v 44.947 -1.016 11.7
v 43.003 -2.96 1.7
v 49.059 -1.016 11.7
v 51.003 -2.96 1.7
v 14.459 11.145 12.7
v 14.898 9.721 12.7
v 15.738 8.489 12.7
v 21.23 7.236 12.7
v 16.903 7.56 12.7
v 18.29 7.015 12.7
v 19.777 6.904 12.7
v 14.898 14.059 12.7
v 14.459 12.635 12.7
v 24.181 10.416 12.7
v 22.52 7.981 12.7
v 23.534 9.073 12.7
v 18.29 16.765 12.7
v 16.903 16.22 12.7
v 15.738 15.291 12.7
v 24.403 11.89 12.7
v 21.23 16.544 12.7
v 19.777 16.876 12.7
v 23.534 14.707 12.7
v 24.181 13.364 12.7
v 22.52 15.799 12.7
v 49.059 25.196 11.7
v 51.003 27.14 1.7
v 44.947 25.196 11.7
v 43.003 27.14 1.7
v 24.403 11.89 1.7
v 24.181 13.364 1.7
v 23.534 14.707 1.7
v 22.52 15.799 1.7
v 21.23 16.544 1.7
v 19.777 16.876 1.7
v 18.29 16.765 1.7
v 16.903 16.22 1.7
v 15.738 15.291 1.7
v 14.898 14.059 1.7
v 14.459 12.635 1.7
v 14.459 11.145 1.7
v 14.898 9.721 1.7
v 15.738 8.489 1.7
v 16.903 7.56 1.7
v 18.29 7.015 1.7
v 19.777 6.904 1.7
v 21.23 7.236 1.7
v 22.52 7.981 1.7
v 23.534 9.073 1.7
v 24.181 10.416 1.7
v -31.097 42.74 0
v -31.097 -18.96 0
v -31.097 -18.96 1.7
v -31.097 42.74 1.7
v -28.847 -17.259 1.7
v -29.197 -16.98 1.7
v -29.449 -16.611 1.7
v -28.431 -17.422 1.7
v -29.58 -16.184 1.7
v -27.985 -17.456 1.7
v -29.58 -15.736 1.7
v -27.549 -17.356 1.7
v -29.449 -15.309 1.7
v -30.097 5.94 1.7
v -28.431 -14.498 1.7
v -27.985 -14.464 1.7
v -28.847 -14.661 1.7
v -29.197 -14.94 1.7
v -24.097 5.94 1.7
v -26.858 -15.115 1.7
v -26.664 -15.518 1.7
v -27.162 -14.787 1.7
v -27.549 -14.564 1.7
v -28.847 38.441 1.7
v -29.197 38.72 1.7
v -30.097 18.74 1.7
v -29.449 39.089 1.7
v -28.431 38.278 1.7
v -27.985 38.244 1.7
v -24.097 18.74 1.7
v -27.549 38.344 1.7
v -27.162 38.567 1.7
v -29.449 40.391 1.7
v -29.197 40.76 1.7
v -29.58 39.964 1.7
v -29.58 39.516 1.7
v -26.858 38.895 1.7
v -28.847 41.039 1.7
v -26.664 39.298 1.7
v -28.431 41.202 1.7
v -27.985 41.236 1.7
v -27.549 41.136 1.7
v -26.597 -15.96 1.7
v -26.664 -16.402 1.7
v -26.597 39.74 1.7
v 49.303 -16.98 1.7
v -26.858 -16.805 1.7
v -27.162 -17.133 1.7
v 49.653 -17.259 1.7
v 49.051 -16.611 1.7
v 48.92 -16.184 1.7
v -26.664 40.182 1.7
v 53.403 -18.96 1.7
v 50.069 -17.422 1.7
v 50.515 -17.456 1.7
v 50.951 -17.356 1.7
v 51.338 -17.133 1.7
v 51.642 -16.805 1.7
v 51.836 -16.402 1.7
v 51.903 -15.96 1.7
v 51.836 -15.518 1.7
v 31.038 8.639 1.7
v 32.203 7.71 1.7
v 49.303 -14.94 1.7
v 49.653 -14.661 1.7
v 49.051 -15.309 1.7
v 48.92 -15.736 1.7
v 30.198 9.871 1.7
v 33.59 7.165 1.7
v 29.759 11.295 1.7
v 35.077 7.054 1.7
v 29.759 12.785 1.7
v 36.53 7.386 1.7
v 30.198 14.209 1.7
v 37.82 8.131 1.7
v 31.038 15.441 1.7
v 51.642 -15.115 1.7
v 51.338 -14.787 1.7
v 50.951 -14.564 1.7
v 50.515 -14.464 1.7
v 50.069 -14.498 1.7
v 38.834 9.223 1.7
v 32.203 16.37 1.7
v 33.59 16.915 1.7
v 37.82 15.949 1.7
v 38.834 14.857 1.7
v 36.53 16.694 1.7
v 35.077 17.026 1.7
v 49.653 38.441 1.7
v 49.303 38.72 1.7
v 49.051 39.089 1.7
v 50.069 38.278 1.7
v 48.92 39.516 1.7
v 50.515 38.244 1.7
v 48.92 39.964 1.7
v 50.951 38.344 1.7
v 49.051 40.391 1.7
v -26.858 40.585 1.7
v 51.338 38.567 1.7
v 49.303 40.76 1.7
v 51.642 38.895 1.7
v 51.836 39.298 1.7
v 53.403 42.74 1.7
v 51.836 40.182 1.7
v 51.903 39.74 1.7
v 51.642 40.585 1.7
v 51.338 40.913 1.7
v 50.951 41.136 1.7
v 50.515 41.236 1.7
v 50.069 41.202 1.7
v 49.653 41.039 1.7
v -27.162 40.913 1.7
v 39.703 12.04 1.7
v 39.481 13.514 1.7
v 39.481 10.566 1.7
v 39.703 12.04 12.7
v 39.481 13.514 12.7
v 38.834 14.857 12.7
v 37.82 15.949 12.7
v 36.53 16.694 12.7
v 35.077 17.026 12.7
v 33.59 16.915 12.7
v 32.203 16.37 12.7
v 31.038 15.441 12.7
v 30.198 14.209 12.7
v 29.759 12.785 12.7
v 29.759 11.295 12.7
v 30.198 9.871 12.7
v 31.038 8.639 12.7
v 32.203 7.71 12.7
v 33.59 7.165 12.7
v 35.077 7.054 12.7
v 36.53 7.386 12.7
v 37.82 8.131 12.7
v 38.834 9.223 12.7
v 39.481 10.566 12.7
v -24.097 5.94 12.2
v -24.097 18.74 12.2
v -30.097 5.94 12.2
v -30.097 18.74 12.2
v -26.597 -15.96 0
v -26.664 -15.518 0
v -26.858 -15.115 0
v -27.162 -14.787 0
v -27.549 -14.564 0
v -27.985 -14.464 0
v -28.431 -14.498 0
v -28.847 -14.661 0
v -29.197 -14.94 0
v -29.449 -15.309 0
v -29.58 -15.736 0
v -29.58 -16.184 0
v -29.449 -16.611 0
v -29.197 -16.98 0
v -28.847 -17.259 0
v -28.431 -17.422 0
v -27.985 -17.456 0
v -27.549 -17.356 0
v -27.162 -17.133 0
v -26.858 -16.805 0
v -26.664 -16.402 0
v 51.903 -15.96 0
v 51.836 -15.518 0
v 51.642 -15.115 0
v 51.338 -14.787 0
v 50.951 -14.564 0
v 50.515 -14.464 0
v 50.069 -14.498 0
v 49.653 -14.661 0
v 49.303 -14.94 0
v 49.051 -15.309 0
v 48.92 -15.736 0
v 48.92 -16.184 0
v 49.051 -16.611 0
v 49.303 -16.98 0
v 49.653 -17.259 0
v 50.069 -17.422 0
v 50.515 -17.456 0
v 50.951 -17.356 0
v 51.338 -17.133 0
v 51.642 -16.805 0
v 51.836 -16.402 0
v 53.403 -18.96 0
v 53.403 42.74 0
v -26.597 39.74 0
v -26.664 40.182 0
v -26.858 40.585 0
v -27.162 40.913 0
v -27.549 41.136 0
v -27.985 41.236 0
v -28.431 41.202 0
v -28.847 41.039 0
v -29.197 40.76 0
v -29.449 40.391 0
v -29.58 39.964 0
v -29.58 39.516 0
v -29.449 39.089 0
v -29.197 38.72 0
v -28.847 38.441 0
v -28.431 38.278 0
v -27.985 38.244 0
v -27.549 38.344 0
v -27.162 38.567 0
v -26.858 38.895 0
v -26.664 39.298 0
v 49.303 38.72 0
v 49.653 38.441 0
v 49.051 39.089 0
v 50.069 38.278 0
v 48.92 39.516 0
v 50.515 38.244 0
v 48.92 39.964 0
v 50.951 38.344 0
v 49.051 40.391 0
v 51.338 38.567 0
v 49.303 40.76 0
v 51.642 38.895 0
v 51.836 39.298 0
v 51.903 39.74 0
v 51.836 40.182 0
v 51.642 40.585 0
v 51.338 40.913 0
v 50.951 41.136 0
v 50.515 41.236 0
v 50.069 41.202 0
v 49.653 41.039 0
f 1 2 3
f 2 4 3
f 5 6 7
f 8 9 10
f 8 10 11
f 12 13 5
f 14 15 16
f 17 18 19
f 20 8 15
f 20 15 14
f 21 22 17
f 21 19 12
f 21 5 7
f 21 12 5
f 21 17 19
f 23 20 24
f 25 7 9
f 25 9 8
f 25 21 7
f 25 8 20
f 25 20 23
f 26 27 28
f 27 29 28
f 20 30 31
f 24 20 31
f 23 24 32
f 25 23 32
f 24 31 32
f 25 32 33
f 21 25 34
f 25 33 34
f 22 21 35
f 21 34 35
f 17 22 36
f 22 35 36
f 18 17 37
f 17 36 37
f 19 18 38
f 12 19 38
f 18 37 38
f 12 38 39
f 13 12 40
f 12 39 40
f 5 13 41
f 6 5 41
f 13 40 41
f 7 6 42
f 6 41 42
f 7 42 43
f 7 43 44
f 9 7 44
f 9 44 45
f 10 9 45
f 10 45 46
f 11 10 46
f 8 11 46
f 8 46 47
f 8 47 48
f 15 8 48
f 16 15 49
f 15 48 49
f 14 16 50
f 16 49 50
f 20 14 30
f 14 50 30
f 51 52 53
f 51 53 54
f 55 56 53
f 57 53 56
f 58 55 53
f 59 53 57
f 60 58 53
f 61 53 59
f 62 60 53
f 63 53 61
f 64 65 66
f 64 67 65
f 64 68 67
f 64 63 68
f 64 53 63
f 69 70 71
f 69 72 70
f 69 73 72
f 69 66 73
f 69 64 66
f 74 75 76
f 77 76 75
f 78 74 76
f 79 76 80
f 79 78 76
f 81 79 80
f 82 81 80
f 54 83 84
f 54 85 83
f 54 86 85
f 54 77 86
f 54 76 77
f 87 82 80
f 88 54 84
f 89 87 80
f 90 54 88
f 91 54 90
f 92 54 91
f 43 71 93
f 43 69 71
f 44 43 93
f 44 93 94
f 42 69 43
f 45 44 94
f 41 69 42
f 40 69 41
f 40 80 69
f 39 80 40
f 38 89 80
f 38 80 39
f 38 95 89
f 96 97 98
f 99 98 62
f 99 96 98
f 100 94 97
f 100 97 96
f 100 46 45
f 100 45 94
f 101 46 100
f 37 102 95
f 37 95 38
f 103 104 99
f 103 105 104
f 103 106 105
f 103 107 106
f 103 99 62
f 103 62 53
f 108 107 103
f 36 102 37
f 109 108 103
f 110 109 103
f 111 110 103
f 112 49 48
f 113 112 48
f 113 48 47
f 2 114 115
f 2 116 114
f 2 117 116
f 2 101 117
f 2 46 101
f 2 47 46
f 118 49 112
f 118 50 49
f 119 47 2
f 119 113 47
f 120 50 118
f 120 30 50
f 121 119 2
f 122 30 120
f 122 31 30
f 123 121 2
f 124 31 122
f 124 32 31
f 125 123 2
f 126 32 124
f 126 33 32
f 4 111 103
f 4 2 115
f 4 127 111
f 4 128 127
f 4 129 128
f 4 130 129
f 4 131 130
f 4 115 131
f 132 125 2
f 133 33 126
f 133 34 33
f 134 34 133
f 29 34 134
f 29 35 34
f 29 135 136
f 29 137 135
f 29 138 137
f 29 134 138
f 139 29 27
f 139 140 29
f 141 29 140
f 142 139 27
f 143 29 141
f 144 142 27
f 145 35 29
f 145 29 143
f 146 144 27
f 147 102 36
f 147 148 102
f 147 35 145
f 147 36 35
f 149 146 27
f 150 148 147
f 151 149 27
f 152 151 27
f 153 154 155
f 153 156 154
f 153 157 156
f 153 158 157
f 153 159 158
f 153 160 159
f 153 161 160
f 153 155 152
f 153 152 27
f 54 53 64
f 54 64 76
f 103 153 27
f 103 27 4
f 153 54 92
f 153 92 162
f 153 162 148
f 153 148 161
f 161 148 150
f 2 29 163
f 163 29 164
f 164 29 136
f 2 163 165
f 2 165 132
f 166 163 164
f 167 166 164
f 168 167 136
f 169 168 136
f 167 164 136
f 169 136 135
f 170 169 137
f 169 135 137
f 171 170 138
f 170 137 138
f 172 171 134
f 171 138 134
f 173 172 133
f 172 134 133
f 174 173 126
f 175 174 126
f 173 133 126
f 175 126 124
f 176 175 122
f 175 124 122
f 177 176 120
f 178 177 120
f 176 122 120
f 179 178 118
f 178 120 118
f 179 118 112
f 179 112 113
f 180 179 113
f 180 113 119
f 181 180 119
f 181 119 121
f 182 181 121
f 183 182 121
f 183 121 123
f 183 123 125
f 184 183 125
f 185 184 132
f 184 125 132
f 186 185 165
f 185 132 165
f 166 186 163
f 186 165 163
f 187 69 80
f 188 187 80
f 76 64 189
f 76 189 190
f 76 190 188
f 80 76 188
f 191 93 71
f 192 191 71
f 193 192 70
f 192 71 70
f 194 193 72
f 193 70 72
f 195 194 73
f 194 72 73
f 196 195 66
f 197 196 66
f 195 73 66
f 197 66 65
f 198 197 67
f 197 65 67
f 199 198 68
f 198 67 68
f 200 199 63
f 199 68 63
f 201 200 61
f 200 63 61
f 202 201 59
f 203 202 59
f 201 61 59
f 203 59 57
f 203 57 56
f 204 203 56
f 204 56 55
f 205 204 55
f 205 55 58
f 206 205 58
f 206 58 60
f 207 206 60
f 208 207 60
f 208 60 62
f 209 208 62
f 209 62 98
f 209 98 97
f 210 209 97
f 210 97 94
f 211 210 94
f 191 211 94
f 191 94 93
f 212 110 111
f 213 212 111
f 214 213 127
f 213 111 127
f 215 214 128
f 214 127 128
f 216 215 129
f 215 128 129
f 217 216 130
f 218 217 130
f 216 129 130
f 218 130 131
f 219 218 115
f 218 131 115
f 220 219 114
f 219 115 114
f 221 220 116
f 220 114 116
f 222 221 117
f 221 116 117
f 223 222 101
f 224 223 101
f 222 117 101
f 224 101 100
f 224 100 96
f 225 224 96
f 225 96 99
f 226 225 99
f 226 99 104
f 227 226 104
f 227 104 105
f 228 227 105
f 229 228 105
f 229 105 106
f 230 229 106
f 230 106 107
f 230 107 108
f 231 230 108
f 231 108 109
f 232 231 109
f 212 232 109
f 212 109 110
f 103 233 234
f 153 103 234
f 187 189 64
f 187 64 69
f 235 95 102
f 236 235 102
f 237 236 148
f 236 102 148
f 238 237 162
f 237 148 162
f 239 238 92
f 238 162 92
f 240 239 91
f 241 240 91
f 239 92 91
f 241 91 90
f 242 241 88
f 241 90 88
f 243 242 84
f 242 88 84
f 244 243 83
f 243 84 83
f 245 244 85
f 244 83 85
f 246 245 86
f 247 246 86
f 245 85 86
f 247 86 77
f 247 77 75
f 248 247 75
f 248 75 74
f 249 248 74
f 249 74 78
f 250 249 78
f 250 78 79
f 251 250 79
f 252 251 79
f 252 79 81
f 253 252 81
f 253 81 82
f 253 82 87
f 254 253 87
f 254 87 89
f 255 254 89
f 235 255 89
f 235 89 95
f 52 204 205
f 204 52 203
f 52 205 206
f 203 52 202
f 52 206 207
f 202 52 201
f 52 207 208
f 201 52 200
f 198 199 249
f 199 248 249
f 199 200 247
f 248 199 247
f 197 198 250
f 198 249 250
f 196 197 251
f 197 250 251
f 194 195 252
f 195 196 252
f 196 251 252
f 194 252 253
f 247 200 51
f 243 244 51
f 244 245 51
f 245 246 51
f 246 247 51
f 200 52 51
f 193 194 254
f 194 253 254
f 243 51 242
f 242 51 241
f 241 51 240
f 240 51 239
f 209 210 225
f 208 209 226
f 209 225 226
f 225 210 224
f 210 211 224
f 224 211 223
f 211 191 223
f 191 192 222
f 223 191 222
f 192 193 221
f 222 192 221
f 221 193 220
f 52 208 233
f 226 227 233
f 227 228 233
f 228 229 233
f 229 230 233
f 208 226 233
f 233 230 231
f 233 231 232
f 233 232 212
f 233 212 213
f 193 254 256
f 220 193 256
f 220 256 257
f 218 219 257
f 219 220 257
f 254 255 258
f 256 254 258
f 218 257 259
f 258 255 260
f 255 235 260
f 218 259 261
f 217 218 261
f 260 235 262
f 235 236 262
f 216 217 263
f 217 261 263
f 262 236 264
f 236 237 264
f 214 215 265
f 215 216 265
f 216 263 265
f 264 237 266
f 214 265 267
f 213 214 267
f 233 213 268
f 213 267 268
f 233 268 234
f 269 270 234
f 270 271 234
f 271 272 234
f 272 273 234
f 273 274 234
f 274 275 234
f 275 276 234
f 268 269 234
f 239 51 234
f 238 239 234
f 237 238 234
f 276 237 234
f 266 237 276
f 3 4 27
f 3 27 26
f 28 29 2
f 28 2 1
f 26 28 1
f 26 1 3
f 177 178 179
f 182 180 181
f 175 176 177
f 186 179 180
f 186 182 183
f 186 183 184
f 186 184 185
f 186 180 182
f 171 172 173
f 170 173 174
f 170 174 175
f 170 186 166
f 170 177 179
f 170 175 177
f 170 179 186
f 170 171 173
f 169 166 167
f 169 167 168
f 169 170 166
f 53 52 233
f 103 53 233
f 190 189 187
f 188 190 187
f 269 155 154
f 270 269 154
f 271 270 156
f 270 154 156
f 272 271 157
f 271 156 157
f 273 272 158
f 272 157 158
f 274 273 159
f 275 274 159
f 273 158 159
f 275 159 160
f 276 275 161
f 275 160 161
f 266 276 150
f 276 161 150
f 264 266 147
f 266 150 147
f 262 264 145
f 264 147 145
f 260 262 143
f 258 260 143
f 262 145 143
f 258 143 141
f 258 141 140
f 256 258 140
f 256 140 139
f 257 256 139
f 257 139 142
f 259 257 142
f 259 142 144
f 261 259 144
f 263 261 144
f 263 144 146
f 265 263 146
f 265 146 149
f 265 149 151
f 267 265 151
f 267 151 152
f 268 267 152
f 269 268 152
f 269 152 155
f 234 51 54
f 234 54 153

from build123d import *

# Parameters (mm, degrees)
SKETCH1_W           = 84.5
SKETCH1_H           = 61.7
BOSS_EXTRUDE1_DEPTH = 1.7
SKETCH2_W           = 8
SKETCH2_H           = 30.1
BOSS_EXTRUDE2_DEPTH = 10
BOSS_EXTRUDE2_TAPER = 11
SKETCH3_R           = 5
BOSS_EXTRUDE3_DEPTH = 11
SKETCH4_R           = 5
BOSS_EXTRUDE4_DEPTH = 11
SKETCH5_W           = 6
SKETCH5_H           = 12.8
BOSS_EXTRUDE5_DEPTH = 10.5
SKETCH6_R           = 1.5
CUT_EXTRUDE1_DEPTH  = 10
SKETCH7_R           = 1.5
CUT_EXTRUDE2_DEPTH  = 10
SKETCH8_R           = 1.5
CUT_EXTRUDE3_DEPTH  = 10
SKETCH9_R           = 1.5
CUT_EXTRUDE4_DEPTH  = 10


with BuildPart() as part:
    # Sketch1 → Boss-Extrude1 (new body)
    with BuildSketch(Plane.XY):
        with Locations((11.152950311, 11.889984472)):
            Rectangle(SKETCH1_W, SKETCH1_H)
    extrude(amount=BOSS_EXTRUDE1_DEPTH)

    # Sketch2 → Boss-Extrude2 (add)
    with BuildSketch(Plane.XY.offset(1.7)):
        with Locations((47.002950311, 12.089984472)):
            Rectangle(SKETCH2_W, SKETCH2_H)
    extrude(amount=BOSS_EXTRUDE2_DEPTH, taper=BOSS_EXTRUDE2_TAPER)

    # Sketch3 → Boss-Extrude3 (add)
    with BuildSketch(Plane.XY.offset(1.7)):
        with Locations((19.402950311, 11.889984472)):
            Circle(SKETCH3_R)
    extrude(amount=BOSS_EXTRUDE3_DEPTH)

    # Sketch4 → Boss-Extrude4 (add)
    with BuildSketch(Plane.XY.offset(1.7)):
        with Locations((34.702950311, 12.039984472)):
            Circle(SKETCH4_R)
    extrude(amount=BOSS_EXTRUDE4_DEPTH)

    # Sketch5 → Boss-Extrude5 (add)
    with BuildSketch(Plane.XY.offset(1.7)):
        with Locations((-27.097049689, 12.339984472)):
            Rectangle(SKETCH5_W, SKETCH5_H)
    extrude(amount=BOSS_EXTRUDE5_DEPTH)

    # Sketch6 → Cut-Extrude1 (cut)
    with BuildSketch(Plane.XY.offset(1.7)):
        with Locations((-28.097049689, -15.960015528)):
            Circle(SKETCH6_R)
    extrude(amount=-CUT_EXTRUDE1_DEPTH, mode=Mode.SUBTRACT)

    # Sketch7 → Cut-Extrude2 (cut)
    with BuildSketch(Plane.XY.offset(1.7)):
        with Locations((-28.097049689, 39.739984472)):
            Circle(SKETCH7_R)
    extrude(amount=-CUT_EXTRUDE2_DEPTH, mode=Mode.SUBTRACT)

    # Sketch8 → Cut-Extrude3 (cut)
    with BuildSketch(Plane.XY.offset(1.7)):
        with Locations((50.402950311, -15.960015528)):
            Circle(SKETCH8_R)
    extrude(amount=-CUT_EXTRUDE3_DEPTH, mode=Mode.SUBTRACT)

    # Sketch9 → Cut-Extrude4 (cut)
    with BuildSketch(Plane.XY.offset(1.7)):
        with Locations((50.402950311, 39.739984472)):
            Circle(SKETCH9_R)
    extrude(amount=-CUT_EXTRUDE4_DEPTH, mode=Mode.SUBTRACT)


solid = part.part
